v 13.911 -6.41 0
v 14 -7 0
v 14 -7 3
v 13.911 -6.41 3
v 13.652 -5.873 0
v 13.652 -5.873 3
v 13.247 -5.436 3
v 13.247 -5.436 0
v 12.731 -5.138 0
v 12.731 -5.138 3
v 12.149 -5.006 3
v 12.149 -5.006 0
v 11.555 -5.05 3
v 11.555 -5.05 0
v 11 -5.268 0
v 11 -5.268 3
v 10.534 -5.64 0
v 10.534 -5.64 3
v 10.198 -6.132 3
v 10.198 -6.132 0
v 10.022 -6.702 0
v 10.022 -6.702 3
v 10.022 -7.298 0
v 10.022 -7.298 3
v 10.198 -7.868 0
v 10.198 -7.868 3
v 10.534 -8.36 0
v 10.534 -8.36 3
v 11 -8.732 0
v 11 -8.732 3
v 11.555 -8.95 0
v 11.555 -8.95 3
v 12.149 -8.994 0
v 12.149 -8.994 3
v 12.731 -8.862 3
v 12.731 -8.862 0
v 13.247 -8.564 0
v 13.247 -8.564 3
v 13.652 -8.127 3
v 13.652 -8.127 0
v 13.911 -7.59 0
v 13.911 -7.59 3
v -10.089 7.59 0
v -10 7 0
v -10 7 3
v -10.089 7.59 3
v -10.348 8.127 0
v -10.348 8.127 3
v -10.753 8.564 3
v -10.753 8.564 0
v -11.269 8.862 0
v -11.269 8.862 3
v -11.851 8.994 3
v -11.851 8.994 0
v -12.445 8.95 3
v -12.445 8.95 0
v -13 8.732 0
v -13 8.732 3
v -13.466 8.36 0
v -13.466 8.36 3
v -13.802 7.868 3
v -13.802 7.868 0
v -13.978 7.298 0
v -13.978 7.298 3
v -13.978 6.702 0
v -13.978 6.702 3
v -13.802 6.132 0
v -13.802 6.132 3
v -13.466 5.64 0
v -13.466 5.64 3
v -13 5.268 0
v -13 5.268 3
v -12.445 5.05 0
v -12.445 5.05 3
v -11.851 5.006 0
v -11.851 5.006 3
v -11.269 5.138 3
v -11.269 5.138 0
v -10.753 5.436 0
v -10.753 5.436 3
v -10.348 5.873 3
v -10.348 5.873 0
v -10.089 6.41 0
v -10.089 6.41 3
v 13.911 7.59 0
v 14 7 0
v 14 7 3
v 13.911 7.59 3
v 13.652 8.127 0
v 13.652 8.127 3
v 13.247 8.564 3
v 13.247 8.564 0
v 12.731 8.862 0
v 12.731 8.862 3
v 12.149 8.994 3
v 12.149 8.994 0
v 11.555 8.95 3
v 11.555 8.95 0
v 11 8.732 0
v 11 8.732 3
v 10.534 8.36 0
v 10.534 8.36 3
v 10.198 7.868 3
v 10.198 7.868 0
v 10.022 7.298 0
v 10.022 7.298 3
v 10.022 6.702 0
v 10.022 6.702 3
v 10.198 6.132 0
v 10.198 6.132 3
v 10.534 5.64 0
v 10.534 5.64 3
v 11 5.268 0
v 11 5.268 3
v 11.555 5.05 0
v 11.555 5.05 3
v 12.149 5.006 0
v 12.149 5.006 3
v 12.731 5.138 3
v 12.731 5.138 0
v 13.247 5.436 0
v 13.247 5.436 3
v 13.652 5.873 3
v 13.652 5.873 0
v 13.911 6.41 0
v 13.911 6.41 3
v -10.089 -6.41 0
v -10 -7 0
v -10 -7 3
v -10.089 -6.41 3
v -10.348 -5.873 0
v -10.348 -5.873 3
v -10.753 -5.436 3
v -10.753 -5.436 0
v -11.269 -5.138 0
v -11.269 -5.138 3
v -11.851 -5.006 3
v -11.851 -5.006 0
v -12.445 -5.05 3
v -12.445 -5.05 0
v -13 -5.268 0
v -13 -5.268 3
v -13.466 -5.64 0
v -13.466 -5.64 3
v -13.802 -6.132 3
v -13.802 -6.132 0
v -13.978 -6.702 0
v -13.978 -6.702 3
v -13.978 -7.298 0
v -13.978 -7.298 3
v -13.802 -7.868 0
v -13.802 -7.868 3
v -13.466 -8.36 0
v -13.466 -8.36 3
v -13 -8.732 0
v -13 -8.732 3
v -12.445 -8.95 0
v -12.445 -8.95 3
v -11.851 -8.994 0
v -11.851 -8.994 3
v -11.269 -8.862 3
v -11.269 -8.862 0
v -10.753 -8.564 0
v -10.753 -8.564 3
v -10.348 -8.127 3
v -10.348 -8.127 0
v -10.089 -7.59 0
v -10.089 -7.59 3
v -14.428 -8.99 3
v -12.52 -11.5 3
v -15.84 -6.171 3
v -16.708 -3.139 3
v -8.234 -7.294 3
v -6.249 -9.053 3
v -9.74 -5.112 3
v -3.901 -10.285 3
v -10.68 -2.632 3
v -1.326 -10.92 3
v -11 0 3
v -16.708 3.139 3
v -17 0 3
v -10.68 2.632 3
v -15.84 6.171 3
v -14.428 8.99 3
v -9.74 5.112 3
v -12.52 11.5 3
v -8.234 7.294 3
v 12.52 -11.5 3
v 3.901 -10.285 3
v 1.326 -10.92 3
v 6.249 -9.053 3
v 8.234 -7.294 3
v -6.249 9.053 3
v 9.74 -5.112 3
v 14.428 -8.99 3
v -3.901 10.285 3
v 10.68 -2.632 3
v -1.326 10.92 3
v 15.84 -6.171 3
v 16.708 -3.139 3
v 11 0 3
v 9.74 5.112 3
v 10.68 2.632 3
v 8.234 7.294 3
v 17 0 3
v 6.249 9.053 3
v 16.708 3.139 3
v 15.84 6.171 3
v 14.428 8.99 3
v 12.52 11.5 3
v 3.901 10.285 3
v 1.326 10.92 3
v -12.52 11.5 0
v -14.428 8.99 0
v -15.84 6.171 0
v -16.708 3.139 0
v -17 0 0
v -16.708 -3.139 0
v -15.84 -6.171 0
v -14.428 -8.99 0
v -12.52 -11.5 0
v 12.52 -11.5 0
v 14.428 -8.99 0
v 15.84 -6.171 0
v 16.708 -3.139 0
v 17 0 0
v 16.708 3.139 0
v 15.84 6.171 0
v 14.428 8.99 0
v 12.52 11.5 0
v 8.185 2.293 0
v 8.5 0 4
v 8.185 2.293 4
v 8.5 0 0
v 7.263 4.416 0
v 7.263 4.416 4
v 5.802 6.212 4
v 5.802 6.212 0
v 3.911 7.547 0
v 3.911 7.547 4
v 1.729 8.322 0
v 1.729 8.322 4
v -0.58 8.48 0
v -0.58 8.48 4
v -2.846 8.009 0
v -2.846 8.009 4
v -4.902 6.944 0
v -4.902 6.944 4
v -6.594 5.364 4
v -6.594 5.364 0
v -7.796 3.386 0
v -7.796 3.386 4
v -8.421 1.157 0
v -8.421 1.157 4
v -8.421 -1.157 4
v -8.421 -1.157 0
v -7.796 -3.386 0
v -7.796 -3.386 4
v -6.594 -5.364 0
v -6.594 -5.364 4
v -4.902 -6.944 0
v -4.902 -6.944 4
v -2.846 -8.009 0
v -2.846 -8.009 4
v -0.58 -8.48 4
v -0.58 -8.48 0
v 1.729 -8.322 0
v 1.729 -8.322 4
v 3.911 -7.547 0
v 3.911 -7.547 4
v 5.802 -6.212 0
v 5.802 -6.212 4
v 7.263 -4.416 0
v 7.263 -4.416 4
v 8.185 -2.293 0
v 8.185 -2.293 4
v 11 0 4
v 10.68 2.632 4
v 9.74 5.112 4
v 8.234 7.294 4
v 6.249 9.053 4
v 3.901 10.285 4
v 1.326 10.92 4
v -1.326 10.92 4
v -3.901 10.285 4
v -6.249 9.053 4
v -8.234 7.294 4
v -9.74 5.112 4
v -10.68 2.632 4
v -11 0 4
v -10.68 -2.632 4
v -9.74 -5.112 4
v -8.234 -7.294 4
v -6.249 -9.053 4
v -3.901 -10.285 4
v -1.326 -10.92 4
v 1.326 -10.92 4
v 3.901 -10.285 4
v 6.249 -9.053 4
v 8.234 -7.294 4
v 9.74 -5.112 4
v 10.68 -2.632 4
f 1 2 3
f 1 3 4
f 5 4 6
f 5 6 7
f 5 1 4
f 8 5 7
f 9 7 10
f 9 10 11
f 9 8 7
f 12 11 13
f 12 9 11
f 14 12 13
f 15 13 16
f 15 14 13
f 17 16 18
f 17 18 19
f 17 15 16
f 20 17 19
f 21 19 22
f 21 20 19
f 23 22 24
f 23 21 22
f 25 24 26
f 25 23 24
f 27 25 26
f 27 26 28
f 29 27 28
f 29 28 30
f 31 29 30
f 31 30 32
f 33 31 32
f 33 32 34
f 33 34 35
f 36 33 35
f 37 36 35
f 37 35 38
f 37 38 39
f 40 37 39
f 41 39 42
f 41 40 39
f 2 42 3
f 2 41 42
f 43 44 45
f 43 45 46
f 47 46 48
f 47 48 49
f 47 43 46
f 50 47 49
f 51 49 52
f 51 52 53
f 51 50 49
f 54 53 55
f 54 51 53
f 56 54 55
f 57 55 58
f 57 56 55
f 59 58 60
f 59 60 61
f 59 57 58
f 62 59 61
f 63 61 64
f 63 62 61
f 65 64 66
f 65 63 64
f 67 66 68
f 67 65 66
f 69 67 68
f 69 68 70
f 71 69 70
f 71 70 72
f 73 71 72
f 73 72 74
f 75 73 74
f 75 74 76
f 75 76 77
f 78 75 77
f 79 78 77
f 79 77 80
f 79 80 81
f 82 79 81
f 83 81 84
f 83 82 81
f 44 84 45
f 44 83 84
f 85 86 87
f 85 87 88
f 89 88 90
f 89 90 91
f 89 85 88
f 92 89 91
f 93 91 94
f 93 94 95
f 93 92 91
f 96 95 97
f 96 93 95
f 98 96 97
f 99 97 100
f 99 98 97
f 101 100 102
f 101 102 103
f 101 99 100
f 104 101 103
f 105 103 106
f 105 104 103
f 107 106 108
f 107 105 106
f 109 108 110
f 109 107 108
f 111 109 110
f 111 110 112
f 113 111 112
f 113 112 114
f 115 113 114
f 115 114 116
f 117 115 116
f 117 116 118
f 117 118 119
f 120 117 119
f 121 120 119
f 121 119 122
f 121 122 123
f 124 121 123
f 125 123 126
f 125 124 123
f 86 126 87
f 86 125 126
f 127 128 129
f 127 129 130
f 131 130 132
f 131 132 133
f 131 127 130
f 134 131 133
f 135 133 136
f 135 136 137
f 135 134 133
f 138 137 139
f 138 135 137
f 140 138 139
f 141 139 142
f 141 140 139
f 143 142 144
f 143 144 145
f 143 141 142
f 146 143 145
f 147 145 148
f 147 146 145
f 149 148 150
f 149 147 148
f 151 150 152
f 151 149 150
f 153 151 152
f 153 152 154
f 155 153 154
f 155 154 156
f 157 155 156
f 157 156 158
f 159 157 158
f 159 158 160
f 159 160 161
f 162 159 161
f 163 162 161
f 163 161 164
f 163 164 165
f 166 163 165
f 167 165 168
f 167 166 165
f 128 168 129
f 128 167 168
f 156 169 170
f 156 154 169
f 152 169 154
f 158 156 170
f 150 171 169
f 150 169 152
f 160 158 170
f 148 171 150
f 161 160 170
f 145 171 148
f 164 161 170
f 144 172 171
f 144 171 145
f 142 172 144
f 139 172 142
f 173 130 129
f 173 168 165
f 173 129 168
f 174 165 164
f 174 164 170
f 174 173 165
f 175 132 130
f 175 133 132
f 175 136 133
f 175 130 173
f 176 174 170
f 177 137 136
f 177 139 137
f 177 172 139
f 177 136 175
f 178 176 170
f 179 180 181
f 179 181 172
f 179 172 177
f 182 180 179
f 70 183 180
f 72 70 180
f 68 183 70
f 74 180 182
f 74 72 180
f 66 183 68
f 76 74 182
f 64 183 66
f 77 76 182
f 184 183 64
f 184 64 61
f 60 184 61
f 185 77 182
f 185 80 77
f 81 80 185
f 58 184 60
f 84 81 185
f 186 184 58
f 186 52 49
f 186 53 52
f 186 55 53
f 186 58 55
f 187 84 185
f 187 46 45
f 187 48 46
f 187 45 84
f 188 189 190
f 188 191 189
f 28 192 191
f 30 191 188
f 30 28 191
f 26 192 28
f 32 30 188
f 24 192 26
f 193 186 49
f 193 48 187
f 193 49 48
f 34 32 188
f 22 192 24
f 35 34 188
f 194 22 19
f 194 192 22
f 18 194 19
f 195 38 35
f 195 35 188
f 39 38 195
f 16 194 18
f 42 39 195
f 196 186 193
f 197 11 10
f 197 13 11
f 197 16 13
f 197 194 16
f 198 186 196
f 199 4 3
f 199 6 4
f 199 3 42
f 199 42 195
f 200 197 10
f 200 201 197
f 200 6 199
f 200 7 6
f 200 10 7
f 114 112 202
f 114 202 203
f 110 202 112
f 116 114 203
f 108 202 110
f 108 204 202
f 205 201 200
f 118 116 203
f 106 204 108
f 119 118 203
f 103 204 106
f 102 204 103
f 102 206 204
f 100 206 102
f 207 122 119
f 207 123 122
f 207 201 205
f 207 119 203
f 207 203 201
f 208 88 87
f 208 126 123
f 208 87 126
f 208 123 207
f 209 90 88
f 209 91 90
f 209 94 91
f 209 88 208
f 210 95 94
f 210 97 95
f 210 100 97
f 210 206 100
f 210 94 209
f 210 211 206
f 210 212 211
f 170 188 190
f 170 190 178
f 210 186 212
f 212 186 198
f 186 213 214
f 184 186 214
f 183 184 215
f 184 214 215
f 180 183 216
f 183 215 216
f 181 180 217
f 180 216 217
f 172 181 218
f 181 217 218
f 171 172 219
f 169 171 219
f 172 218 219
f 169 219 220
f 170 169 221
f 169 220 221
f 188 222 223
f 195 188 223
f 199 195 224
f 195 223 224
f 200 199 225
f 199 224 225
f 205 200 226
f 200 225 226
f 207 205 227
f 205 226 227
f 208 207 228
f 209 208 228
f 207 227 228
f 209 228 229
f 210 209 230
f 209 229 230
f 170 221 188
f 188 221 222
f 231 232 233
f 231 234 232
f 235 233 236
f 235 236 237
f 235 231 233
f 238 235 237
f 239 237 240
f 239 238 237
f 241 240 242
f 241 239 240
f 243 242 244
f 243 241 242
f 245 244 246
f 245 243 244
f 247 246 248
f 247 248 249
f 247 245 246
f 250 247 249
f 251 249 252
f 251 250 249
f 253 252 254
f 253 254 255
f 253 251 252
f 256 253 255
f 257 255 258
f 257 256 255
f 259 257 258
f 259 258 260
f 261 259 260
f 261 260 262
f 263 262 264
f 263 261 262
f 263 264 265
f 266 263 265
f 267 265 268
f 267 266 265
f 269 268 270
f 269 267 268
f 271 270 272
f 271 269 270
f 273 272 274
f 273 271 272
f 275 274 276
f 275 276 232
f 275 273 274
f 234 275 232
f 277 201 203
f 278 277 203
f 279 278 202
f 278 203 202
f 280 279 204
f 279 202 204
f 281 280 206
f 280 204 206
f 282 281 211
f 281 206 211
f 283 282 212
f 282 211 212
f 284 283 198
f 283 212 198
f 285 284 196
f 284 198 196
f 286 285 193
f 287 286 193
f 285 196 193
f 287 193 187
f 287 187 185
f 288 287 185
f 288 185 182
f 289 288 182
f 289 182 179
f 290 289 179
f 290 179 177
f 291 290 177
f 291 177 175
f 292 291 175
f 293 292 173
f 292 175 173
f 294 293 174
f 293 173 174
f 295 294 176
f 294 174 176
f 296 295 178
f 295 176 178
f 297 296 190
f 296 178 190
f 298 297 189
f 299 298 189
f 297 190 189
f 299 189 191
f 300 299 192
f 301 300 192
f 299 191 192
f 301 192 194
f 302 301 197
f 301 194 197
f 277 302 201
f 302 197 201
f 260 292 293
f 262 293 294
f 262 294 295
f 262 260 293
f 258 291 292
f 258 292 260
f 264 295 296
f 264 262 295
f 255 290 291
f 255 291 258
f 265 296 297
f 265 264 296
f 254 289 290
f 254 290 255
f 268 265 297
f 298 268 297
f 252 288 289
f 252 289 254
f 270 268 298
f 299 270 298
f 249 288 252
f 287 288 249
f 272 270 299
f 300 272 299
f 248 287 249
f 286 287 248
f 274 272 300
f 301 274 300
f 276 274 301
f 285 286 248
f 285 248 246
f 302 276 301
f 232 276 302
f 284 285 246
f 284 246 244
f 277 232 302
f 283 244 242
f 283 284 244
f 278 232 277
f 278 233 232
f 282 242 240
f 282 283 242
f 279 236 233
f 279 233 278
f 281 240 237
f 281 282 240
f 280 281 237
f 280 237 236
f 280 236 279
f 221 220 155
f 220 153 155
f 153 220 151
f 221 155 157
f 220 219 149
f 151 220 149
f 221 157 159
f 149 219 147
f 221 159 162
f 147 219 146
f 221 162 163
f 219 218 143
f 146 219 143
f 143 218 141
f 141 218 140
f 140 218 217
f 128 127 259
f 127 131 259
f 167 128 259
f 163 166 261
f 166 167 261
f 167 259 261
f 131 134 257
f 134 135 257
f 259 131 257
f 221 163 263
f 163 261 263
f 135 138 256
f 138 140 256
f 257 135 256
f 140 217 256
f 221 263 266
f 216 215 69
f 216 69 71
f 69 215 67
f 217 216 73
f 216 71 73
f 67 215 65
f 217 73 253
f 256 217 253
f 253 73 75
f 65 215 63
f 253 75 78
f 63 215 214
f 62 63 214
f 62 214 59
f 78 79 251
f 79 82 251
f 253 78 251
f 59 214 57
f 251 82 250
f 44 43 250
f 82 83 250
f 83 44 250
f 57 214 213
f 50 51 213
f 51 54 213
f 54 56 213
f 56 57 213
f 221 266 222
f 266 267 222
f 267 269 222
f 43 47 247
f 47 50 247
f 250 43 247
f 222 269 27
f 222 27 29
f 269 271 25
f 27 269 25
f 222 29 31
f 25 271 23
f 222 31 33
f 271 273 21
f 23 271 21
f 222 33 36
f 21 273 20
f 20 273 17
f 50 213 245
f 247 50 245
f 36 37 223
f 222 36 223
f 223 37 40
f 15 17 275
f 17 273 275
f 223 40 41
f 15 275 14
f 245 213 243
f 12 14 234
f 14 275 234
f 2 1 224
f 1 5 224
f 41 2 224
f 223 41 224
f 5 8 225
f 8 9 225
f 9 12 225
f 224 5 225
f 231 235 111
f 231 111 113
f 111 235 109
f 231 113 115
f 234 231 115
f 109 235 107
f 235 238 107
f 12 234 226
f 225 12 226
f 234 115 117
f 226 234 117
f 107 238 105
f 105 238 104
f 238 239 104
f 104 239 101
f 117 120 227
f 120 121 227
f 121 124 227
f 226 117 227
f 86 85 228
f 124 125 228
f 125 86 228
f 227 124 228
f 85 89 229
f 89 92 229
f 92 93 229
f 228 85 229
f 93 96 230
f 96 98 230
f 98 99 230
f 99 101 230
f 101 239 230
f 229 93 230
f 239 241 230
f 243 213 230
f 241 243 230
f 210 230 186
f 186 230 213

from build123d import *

# Parameters (mm, degrees)
SKETCH_1_R      = 2
SKETCH_1_R_2    = 8.5
EXTRUDE_1_DEPTH = 3
SKETCH_2_R      = 11
SKETCH_2_R_2    = 8.5
EXTRUDE_2_DEPTH = 1


with BuildPart() as part:
    # 草图1 → 凸台-拉伸1 (new body)
    with BuildSketch(Plane.XY):
        with BuildLine():
            Line((-12.519984026, -11.5), (12.519984026, -11.5))
            ThreePointArc((12.519984026, -11.5), (17, 0), (12.519984026, 11.5))
            Line((12.519984026, 11.5), (-12.519984026, 11.5))
            ThreePointArc((-12.519984026, 11.5), (-17, 0), (-12.519984026, -11.5))
        make_face()
        with Locations((-12, -7)):
            Circle(SKETCH_1_R, mode=Mode.SUBTRACT)
        with Locations((-12, 7)):
            Circle(SKETCH_1_R, mode=Mode.SUBTRACT)
        with Locations((12, 7)):
            Circle(SKETCH_1_R, mode=Mode.SUBTRACT)
        with Locations((12, -7)):
            Circle(SKETCH_1_R, mode=Mode.SUBTRACT)
        Circle(SKETCH_1_R_2, mode=Mode.SUBTRACT)
    extrude(amount=EXTRUDE_1_DEPTH)

    # 草图2 → 凸台-拉伸2 (add)
    with BuildSketch(Plane.XY.offset(3)):
        Circle(SKETCH_2_R)
        Circle(SKETCH_2_R_2, mode=Mode.SUBTRACT)
    extrude(amount=EXTRUDE_2_DEPTH)


solid = part.part
